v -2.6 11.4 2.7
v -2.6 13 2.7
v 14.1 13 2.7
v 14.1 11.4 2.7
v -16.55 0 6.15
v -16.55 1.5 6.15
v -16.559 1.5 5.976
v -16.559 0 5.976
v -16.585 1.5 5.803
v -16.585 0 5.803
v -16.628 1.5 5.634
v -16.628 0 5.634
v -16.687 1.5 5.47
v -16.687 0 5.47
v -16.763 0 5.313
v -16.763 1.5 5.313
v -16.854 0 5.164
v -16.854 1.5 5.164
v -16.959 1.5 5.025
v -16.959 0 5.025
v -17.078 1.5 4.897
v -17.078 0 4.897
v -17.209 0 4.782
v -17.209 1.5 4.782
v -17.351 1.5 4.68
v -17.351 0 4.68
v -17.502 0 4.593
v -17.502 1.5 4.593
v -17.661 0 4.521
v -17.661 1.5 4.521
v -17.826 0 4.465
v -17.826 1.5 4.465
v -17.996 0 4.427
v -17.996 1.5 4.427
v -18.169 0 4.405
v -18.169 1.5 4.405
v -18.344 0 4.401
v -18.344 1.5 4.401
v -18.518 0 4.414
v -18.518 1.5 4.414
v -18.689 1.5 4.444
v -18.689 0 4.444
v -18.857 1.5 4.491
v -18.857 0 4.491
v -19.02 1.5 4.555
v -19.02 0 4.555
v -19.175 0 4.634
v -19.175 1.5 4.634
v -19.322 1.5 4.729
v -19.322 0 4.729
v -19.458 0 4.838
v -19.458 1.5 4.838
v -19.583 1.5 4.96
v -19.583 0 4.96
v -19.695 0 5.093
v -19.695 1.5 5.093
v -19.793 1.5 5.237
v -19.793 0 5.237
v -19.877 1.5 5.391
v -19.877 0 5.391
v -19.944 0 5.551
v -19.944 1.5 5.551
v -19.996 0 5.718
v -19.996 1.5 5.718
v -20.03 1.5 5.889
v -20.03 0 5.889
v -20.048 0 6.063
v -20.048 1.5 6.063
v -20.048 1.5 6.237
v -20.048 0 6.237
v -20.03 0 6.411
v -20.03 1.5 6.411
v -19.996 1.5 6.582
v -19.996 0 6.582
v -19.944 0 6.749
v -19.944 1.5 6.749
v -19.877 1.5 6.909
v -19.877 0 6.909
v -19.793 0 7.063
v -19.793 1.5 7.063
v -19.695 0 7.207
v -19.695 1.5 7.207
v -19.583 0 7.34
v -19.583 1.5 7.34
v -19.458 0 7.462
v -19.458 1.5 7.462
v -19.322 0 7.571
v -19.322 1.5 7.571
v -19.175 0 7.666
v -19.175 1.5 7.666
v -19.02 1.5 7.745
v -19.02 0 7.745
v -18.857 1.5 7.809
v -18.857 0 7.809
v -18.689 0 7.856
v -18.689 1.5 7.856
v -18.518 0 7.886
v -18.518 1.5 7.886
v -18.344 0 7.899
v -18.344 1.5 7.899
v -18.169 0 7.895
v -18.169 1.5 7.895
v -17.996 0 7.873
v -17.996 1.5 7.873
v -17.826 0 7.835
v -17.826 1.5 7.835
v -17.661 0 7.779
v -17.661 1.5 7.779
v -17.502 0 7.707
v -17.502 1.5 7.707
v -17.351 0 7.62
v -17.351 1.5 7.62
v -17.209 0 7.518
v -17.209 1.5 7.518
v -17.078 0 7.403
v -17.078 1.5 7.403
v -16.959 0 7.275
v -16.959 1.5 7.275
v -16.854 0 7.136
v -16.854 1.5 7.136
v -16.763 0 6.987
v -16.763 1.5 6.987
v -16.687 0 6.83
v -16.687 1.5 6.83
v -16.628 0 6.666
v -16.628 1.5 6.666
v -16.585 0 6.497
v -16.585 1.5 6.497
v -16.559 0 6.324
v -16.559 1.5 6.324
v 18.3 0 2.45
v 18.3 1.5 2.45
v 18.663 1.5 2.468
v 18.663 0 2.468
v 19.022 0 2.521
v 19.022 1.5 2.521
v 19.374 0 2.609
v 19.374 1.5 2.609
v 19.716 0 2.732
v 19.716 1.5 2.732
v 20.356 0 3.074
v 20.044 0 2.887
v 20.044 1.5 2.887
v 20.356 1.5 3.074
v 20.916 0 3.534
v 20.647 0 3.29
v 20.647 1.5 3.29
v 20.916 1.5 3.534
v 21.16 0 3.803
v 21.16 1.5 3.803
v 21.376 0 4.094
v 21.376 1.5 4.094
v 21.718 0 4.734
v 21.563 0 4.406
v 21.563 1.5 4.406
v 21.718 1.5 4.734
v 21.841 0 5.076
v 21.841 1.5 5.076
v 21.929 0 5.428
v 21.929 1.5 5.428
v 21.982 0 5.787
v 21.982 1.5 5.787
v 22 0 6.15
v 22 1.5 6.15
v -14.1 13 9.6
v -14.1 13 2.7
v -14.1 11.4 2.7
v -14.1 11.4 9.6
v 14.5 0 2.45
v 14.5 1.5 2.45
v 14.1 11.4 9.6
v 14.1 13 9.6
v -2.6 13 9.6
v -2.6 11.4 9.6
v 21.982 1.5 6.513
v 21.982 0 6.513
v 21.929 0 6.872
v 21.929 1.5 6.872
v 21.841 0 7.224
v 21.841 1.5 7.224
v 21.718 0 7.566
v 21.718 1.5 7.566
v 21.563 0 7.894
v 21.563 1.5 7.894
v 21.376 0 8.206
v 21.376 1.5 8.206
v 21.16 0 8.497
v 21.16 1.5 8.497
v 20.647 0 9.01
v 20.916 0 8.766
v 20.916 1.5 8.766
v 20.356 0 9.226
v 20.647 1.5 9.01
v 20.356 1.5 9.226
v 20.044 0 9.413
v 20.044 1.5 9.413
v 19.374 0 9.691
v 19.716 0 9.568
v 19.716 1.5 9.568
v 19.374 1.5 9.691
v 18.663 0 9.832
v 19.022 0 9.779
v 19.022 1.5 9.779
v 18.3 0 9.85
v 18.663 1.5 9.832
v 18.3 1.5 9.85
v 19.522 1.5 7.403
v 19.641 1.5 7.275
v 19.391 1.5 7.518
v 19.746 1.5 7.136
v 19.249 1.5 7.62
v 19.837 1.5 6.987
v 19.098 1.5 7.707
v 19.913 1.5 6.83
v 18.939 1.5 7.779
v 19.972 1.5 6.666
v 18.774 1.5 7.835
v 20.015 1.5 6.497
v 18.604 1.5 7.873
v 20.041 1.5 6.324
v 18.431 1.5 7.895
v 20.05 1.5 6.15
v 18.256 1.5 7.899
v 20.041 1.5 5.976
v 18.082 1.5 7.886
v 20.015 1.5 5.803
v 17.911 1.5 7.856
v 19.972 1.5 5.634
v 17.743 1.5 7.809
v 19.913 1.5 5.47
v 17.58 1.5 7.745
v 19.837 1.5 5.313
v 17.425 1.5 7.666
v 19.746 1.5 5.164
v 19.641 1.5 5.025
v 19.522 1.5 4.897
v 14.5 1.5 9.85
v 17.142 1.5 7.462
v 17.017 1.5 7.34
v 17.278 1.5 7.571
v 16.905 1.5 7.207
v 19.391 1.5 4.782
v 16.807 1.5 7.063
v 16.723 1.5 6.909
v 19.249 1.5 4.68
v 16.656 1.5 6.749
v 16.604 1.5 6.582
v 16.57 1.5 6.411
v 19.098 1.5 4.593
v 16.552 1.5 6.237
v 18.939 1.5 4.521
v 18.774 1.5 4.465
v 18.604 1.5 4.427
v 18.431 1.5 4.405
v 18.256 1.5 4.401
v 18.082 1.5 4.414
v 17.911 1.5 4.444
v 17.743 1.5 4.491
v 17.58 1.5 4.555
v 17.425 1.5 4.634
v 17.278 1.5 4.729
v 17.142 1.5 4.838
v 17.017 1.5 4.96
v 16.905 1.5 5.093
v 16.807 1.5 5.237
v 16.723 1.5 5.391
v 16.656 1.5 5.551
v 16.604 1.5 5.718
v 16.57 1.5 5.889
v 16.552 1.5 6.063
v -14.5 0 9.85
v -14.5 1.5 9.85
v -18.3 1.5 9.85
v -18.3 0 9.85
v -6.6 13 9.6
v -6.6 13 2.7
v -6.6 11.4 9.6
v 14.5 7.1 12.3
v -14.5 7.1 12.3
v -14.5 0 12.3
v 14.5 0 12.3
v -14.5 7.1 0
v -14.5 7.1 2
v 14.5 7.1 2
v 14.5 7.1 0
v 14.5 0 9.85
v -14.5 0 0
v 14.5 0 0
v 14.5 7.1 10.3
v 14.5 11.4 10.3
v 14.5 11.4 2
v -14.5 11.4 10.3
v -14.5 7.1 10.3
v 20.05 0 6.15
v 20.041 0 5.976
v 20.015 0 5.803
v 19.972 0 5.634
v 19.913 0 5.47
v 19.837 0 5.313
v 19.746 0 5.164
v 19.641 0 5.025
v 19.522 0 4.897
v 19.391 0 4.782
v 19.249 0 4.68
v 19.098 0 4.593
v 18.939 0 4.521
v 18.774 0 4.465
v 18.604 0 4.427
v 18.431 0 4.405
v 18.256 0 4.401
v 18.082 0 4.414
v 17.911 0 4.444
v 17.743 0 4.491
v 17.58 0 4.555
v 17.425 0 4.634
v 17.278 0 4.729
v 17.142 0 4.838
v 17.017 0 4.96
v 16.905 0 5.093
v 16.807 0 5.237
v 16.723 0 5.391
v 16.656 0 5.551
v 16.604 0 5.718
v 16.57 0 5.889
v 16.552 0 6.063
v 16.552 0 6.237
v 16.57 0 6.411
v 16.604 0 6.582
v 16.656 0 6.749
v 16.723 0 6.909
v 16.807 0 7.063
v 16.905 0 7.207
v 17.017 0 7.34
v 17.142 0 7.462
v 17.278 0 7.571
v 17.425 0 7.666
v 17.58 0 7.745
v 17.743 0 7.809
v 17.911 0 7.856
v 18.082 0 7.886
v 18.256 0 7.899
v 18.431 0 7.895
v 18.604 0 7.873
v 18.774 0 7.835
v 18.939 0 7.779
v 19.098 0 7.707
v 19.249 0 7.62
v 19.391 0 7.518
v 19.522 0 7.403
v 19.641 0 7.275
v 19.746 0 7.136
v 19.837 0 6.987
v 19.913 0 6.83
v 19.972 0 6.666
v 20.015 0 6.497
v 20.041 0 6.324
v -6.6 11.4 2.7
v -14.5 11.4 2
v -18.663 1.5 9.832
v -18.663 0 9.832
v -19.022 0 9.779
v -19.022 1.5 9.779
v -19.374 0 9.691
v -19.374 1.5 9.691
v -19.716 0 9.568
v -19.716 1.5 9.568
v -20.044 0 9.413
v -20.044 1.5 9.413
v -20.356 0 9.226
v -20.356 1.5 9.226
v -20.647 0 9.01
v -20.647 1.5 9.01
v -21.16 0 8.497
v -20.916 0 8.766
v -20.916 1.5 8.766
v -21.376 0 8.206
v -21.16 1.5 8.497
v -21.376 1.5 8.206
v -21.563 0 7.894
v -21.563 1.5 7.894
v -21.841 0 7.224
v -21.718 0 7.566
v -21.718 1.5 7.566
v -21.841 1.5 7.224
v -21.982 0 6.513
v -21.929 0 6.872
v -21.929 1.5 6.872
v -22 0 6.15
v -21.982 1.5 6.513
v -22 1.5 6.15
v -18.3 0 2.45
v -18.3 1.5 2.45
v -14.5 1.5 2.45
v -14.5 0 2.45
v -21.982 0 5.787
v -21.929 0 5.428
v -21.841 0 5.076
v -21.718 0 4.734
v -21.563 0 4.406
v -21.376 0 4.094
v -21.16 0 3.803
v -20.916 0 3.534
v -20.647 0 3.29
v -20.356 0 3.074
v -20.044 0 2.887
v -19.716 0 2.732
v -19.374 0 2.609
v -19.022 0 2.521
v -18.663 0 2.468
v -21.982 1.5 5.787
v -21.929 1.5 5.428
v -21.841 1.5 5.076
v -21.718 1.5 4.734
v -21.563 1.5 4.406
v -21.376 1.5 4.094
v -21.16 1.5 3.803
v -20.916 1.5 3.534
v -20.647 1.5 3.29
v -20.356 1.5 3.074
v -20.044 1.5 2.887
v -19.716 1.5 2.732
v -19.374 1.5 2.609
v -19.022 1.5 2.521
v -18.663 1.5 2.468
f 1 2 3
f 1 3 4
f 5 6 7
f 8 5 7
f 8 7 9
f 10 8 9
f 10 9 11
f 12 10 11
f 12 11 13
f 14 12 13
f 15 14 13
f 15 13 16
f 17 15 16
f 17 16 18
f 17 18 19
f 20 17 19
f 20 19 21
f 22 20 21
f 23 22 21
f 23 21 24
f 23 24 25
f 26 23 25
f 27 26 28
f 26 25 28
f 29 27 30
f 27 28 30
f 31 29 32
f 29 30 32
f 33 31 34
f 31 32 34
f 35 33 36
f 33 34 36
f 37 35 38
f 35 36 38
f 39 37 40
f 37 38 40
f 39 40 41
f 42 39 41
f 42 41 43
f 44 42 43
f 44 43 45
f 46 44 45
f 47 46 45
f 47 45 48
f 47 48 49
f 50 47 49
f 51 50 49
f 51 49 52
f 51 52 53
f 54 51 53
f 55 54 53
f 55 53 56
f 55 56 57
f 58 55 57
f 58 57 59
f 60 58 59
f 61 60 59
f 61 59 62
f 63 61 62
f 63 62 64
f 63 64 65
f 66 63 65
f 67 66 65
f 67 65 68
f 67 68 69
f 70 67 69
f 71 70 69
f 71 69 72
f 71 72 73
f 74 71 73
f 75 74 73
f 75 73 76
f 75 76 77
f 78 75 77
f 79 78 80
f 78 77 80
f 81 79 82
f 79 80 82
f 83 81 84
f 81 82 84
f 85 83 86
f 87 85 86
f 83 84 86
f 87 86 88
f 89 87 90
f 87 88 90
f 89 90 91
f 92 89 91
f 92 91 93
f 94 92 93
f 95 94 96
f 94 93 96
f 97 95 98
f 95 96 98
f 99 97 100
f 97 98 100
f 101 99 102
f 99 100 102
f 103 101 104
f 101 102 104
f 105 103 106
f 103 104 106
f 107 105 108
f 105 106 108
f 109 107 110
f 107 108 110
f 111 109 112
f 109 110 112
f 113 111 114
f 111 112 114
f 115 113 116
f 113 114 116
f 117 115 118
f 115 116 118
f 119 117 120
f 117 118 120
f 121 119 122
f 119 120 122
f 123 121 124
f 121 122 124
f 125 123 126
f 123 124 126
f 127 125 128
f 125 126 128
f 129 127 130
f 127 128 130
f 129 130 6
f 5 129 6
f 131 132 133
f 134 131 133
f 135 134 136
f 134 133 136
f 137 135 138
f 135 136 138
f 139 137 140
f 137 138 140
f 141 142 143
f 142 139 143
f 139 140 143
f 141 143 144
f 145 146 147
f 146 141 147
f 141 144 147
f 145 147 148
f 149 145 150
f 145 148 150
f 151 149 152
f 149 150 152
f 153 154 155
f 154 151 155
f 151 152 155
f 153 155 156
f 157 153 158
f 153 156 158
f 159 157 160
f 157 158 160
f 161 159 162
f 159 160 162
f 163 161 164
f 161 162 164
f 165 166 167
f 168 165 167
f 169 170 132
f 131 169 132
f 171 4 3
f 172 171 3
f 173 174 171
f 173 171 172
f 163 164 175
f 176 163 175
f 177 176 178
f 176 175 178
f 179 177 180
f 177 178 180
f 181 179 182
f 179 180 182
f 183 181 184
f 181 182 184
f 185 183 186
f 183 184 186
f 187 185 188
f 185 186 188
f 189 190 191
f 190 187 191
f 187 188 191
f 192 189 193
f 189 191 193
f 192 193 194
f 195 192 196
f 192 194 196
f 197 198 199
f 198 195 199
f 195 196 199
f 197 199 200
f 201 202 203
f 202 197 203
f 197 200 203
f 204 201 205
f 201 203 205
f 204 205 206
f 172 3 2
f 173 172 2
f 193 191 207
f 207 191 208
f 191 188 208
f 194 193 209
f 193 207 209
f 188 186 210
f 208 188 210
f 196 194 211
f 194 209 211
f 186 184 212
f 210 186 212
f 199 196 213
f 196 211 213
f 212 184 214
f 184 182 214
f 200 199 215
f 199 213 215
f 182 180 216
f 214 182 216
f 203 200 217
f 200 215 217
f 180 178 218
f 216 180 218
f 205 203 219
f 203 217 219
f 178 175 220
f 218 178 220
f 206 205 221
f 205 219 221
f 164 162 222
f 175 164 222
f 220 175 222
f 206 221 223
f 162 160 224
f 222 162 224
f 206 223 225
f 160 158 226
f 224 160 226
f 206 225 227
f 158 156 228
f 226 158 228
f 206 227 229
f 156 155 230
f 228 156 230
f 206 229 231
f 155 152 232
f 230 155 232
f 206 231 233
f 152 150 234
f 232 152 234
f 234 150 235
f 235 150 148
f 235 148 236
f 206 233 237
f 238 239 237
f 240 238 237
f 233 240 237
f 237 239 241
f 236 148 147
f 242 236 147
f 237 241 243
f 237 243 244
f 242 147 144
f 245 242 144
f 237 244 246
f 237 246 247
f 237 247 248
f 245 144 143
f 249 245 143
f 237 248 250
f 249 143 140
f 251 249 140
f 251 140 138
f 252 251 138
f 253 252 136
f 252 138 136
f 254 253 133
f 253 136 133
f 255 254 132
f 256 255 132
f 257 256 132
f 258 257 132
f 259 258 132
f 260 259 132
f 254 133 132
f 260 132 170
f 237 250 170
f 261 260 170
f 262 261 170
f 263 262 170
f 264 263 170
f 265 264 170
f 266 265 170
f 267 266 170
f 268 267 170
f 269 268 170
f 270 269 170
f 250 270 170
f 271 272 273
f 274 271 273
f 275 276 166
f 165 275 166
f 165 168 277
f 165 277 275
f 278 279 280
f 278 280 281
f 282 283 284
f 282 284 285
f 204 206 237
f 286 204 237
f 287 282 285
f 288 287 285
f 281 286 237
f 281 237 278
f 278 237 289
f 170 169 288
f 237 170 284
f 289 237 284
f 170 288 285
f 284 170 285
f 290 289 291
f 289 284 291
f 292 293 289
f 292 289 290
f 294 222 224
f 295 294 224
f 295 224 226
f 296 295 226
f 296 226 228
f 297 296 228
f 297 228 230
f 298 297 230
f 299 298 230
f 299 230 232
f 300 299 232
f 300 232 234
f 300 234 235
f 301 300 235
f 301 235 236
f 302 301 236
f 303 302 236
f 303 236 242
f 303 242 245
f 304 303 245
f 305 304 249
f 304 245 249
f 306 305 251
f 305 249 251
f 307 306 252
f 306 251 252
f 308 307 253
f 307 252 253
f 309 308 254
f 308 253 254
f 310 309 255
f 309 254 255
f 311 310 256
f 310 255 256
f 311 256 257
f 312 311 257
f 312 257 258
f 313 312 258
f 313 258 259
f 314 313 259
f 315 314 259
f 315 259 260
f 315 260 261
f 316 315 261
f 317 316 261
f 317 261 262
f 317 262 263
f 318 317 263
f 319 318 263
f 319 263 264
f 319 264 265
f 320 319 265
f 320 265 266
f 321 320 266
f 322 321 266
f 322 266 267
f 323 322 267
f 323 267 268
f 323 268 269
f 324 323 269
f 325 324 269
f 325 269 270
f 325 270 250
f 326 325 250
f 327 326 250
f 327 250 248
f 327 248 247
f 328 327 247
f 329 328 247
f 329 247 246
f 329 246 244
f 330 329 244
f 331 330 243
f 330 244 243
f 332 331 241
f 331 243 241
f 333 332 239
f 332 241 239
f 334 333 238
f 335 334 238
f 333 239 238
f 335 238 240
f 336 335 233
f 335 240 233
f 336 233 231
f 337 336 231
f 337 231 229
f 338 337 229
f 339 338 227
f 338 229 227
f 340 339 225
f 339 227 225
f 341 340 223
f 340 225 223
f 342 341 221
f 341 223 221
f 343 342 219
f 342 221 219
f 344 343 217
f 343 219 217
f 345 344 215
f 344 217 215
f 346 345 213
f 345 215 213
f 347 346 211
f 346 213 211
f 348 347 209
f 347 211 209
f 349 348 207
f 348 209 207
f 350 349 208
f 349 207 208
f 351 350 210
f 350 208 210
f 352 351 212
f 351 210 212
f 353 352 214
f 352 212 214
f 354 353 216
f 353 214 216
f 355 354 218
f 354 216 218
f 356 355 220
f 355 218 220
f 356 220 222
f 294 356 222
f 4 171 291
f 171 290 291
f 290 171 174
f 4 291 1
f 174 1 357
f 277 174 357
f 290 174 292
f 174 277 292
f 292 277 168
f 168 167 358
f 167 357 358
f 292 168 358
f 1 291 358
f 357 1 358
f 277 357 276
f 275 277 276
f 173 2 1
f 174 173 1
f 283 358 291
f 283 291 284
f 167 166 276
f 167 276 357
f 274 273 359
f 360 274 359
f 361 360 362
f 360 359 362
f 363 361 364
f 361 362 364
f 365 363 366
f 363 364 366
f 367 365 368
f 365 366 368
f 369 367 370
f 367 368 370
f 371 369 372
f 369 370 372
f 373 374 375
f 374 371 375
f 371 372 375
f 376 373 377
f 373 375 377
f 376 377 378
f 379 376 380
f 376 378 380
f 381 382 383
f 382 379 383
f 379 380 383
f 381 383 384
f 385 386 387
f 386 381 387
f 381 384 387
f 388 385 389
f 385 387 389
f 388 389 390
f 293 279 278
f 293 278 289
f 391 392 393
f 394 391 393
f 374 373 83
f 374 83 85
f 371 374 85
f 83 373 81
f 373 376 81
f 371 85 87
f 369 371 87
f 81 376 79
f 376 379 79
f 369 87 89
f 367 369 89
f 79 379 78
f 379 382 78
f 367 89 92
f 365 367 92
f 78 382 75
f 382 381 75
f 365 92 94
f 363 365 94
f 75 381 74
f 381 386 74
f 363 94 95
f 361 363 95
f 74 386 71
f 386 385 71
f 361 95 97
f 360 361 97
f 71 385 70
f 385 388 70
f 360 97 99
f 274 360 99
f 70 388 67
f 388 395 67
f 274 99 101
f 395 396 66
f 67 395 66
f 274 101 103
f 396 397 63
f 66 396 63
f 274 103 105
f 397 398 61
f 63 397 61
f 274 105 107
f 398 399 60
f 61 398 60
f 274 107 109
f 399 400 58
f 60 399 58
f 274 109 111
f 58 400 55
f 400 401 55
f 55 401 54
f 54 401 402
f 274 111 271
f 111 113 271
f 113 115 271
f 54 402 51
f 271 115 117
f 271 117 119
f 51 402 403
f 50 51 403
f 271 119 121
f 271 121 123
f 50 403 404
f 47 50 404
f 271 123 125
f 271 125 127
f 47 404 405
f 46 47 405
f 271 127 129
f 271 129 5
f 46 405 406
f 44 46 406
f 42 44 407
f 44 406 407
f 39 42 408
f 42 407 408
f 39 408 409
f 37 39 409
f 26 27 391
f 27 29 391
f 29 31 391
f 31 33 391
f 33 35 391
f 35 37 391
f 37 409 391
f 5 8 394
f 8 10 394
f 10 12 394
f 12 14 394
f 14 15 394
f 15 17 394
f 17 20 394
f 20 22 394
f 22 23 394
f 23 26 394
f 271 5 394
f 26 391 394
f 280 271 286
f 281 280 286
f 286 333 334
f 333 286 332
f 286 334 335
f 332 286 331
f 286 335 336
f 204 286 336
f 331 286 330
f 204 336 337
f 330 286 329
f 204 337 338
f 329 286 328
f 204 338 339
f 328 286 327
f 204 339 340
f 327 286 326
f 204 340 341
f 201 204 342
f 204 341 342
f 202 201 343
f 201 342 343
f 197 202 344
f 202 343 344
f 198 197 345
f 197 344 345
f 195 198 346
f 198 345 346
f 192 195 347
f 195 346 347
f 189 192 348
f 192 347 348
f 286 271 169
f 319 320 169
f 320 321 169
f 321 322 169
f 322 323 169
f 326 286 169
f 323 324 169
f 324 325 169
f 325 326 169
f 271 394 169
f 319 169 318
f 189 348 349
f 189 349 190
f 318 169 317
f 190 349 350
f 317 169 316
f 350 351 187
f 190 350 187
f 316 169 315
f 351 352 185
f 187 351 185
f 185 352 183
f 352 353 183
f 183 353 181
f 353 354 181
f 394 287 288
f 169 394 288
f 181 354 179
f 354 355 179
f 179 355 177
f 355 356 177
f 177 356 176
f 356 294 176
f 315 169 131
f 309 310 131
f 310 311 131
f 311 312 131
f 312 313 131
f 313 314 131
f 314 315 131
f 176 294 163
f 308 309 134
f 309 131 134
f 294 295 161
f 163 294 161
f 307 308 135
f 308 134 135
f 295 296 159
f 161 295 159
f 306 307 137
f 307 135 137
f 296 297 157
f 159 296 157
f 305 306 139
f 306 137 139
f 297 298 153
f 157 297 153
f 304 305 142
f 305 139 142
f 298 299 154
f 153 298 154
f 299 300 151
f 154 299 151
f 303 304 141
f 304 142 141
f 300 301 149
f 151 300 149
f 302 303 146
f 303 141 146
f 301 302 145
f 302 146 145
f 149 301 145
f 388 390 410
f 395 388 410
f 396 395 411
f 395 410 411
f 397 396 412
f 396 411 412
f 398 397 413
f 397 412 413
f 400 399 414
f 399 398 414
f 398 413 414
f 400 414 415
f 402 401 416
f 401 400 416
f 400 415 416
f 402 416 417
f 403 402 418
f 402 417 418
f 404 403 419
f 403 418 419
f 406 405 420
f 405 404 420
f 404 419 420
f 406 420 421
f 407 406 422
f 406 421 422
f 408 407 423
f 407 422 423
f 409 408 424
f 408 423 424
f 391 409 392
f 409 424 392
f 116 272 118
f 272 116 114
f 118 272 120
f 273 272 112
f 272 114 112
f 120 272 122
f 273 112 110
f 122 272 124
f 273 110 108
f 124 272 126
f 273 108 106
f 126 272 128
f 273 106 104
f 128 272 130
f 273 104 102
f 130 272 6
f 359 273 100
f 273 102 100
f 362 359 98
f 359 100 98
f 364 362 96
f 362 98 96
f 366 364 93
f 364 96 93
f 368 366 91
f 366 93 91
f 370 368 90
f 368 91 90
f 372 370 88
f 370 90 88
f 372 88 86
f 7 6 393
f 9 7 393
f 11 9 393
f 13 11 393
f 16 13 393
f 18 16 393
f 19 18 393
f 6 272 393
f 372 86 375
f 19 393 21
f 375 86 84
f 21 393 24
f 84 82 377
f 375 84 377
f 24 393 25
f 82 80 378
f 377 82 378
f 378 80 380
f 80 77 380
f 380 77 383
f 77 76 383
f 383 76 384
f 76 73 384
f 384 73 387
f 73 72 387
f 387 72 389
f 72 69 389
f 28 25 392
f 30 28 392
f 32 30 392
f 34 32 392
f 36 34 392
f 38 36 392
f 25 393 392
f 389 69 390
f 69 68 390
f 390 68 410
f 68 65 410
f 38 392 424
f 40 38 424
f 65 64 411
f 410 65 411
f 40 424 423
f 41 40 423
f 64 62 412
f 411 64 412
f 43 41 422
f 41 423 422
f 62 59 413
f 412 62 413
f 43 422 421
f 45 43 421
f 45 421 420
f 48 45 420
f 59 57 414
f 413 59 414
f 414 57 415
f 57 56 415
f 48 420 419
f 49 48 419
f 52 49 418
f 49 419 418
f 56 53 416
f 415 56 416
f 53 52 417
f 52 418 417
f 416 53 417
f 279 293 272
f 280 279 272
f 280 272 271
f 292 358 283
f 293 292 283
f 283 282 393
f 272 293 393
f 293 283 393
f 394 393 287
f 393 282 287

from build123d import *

# Parameters (mm, degrees)
RESSALTO_EXTRUS_O1_DEPTH = 12.3
ESBO_O2_R                = 1.75
CORTE_EXTRUS_O1_DEPTH    = 22.3
CORTE_EXTRUS_O2_DEPTH    = 32.3


with BuildPart() as part:
    # Esboço1 → Ressalto-extrusão1 (new body)
    with BuildSketch(Plane.XY):
        Polygon((-14.1, 13), (-14.1, 11.4), (-14.5, 11.4), (-14.5, 1.5), (-22, 1.5), (-22, 0), (-14.5, 0), (14.5, 0), (22, 0), (22, 1.5), (14.5, 1.5), (14.5, 11.4), (14.1, 11.4), (14.1, 13), (-2.6, 13), (-2.6, 11.4), (-6.6, 11.4), (-6.6, 13), align=None)
    extrude(amount=RESSALTO_EXTRUS_O1_DEPTH)

    # Esboço2 → Corte-extrusão1 (cut)
    with BuildSketch(Plane(origin=(0, 13, 0), x_dir=(1, 0, 0), z_dir=(0, 1, 0))):
        with BuildLine():
            ThreePointArc((-18.3, -9.85), (-20.91629509, -8.76629509), (-22, -6.15))
            Line((-22, -6.15), (-22, -12.3))
            Line((-22, -12.3), (-14.5, -12.3))
            Line((-14.5, -12.3), (-14.5, -9.85))
            Line((-14.5, -9.85), (-18.3, -9.85))
        make_face()
        with BuildLine():
            ThreePointArc((-22, -6.15), (-20.91629509, -3.53370491), (-18.3, -2.45))
            Line((-18.3, -2.45), (-14.5, -2.45))
            Line((-14.5, -2.45), (-14.5, 0))
            Line((-14.5, 0), (-22, 0))
            Line((-22, 0), (-22, -6.15))
        make_face()
        with BuildLine():
            ThreePointArc((18.3, -2.45), (20.91629509, -3.53370491), (22, -6.15))
            Line((22, -6.15), (22, 0))
            Line((22, 0), (14.5, 0))
            Line((14.5, 0), (14.5, -2.45))
            Line((14.5, -2.45), (18.3, -2.45))
        make_face()
        with BuildLine():
            Line((14.5, -12.3), (22, -12.3))
            Line((22, -12.3), (22, -6.15))
            ThreePointArc((22, -6.15), (20.91629509, -8.76629509), (18.3, -9.85))
            Line((18.3, -9.85), (14.5, -9.85))
            Line((14.5, -9.85), (14.5, -12.3))
        make_face()
        with Locations((-18.3, -6.15)):
            Circle(ESBO_O2_R)
        with Locations((18.3, -6.15)):
            Circle(ESBO_O2_R)
    extrude(amount=-CORTE_EXTRUS_O1_DEPTH, mode=Mode.SUBTRACT)

    # Esboço3 → Corte-extrusão2 (cut)
    with BuildSketch(Plane.ZY.offset(14.5)):
        Polygon((2.7, 13), (2.7, 11.4), (2, 11.4), (2, 7.1), (0, 7.1), (0, 13), align=None)
        Polygon((12.3, 13), (12.3, 7.1), (10.3, 7.1), (10.3, 11.4), (9.6, 11.4), (9.6, 13), align=None)
    extrude(amount=-CORTE_EXTRUS_O2_DEPTH, mode=Mode.SUBTRACT)


solid = part.part
